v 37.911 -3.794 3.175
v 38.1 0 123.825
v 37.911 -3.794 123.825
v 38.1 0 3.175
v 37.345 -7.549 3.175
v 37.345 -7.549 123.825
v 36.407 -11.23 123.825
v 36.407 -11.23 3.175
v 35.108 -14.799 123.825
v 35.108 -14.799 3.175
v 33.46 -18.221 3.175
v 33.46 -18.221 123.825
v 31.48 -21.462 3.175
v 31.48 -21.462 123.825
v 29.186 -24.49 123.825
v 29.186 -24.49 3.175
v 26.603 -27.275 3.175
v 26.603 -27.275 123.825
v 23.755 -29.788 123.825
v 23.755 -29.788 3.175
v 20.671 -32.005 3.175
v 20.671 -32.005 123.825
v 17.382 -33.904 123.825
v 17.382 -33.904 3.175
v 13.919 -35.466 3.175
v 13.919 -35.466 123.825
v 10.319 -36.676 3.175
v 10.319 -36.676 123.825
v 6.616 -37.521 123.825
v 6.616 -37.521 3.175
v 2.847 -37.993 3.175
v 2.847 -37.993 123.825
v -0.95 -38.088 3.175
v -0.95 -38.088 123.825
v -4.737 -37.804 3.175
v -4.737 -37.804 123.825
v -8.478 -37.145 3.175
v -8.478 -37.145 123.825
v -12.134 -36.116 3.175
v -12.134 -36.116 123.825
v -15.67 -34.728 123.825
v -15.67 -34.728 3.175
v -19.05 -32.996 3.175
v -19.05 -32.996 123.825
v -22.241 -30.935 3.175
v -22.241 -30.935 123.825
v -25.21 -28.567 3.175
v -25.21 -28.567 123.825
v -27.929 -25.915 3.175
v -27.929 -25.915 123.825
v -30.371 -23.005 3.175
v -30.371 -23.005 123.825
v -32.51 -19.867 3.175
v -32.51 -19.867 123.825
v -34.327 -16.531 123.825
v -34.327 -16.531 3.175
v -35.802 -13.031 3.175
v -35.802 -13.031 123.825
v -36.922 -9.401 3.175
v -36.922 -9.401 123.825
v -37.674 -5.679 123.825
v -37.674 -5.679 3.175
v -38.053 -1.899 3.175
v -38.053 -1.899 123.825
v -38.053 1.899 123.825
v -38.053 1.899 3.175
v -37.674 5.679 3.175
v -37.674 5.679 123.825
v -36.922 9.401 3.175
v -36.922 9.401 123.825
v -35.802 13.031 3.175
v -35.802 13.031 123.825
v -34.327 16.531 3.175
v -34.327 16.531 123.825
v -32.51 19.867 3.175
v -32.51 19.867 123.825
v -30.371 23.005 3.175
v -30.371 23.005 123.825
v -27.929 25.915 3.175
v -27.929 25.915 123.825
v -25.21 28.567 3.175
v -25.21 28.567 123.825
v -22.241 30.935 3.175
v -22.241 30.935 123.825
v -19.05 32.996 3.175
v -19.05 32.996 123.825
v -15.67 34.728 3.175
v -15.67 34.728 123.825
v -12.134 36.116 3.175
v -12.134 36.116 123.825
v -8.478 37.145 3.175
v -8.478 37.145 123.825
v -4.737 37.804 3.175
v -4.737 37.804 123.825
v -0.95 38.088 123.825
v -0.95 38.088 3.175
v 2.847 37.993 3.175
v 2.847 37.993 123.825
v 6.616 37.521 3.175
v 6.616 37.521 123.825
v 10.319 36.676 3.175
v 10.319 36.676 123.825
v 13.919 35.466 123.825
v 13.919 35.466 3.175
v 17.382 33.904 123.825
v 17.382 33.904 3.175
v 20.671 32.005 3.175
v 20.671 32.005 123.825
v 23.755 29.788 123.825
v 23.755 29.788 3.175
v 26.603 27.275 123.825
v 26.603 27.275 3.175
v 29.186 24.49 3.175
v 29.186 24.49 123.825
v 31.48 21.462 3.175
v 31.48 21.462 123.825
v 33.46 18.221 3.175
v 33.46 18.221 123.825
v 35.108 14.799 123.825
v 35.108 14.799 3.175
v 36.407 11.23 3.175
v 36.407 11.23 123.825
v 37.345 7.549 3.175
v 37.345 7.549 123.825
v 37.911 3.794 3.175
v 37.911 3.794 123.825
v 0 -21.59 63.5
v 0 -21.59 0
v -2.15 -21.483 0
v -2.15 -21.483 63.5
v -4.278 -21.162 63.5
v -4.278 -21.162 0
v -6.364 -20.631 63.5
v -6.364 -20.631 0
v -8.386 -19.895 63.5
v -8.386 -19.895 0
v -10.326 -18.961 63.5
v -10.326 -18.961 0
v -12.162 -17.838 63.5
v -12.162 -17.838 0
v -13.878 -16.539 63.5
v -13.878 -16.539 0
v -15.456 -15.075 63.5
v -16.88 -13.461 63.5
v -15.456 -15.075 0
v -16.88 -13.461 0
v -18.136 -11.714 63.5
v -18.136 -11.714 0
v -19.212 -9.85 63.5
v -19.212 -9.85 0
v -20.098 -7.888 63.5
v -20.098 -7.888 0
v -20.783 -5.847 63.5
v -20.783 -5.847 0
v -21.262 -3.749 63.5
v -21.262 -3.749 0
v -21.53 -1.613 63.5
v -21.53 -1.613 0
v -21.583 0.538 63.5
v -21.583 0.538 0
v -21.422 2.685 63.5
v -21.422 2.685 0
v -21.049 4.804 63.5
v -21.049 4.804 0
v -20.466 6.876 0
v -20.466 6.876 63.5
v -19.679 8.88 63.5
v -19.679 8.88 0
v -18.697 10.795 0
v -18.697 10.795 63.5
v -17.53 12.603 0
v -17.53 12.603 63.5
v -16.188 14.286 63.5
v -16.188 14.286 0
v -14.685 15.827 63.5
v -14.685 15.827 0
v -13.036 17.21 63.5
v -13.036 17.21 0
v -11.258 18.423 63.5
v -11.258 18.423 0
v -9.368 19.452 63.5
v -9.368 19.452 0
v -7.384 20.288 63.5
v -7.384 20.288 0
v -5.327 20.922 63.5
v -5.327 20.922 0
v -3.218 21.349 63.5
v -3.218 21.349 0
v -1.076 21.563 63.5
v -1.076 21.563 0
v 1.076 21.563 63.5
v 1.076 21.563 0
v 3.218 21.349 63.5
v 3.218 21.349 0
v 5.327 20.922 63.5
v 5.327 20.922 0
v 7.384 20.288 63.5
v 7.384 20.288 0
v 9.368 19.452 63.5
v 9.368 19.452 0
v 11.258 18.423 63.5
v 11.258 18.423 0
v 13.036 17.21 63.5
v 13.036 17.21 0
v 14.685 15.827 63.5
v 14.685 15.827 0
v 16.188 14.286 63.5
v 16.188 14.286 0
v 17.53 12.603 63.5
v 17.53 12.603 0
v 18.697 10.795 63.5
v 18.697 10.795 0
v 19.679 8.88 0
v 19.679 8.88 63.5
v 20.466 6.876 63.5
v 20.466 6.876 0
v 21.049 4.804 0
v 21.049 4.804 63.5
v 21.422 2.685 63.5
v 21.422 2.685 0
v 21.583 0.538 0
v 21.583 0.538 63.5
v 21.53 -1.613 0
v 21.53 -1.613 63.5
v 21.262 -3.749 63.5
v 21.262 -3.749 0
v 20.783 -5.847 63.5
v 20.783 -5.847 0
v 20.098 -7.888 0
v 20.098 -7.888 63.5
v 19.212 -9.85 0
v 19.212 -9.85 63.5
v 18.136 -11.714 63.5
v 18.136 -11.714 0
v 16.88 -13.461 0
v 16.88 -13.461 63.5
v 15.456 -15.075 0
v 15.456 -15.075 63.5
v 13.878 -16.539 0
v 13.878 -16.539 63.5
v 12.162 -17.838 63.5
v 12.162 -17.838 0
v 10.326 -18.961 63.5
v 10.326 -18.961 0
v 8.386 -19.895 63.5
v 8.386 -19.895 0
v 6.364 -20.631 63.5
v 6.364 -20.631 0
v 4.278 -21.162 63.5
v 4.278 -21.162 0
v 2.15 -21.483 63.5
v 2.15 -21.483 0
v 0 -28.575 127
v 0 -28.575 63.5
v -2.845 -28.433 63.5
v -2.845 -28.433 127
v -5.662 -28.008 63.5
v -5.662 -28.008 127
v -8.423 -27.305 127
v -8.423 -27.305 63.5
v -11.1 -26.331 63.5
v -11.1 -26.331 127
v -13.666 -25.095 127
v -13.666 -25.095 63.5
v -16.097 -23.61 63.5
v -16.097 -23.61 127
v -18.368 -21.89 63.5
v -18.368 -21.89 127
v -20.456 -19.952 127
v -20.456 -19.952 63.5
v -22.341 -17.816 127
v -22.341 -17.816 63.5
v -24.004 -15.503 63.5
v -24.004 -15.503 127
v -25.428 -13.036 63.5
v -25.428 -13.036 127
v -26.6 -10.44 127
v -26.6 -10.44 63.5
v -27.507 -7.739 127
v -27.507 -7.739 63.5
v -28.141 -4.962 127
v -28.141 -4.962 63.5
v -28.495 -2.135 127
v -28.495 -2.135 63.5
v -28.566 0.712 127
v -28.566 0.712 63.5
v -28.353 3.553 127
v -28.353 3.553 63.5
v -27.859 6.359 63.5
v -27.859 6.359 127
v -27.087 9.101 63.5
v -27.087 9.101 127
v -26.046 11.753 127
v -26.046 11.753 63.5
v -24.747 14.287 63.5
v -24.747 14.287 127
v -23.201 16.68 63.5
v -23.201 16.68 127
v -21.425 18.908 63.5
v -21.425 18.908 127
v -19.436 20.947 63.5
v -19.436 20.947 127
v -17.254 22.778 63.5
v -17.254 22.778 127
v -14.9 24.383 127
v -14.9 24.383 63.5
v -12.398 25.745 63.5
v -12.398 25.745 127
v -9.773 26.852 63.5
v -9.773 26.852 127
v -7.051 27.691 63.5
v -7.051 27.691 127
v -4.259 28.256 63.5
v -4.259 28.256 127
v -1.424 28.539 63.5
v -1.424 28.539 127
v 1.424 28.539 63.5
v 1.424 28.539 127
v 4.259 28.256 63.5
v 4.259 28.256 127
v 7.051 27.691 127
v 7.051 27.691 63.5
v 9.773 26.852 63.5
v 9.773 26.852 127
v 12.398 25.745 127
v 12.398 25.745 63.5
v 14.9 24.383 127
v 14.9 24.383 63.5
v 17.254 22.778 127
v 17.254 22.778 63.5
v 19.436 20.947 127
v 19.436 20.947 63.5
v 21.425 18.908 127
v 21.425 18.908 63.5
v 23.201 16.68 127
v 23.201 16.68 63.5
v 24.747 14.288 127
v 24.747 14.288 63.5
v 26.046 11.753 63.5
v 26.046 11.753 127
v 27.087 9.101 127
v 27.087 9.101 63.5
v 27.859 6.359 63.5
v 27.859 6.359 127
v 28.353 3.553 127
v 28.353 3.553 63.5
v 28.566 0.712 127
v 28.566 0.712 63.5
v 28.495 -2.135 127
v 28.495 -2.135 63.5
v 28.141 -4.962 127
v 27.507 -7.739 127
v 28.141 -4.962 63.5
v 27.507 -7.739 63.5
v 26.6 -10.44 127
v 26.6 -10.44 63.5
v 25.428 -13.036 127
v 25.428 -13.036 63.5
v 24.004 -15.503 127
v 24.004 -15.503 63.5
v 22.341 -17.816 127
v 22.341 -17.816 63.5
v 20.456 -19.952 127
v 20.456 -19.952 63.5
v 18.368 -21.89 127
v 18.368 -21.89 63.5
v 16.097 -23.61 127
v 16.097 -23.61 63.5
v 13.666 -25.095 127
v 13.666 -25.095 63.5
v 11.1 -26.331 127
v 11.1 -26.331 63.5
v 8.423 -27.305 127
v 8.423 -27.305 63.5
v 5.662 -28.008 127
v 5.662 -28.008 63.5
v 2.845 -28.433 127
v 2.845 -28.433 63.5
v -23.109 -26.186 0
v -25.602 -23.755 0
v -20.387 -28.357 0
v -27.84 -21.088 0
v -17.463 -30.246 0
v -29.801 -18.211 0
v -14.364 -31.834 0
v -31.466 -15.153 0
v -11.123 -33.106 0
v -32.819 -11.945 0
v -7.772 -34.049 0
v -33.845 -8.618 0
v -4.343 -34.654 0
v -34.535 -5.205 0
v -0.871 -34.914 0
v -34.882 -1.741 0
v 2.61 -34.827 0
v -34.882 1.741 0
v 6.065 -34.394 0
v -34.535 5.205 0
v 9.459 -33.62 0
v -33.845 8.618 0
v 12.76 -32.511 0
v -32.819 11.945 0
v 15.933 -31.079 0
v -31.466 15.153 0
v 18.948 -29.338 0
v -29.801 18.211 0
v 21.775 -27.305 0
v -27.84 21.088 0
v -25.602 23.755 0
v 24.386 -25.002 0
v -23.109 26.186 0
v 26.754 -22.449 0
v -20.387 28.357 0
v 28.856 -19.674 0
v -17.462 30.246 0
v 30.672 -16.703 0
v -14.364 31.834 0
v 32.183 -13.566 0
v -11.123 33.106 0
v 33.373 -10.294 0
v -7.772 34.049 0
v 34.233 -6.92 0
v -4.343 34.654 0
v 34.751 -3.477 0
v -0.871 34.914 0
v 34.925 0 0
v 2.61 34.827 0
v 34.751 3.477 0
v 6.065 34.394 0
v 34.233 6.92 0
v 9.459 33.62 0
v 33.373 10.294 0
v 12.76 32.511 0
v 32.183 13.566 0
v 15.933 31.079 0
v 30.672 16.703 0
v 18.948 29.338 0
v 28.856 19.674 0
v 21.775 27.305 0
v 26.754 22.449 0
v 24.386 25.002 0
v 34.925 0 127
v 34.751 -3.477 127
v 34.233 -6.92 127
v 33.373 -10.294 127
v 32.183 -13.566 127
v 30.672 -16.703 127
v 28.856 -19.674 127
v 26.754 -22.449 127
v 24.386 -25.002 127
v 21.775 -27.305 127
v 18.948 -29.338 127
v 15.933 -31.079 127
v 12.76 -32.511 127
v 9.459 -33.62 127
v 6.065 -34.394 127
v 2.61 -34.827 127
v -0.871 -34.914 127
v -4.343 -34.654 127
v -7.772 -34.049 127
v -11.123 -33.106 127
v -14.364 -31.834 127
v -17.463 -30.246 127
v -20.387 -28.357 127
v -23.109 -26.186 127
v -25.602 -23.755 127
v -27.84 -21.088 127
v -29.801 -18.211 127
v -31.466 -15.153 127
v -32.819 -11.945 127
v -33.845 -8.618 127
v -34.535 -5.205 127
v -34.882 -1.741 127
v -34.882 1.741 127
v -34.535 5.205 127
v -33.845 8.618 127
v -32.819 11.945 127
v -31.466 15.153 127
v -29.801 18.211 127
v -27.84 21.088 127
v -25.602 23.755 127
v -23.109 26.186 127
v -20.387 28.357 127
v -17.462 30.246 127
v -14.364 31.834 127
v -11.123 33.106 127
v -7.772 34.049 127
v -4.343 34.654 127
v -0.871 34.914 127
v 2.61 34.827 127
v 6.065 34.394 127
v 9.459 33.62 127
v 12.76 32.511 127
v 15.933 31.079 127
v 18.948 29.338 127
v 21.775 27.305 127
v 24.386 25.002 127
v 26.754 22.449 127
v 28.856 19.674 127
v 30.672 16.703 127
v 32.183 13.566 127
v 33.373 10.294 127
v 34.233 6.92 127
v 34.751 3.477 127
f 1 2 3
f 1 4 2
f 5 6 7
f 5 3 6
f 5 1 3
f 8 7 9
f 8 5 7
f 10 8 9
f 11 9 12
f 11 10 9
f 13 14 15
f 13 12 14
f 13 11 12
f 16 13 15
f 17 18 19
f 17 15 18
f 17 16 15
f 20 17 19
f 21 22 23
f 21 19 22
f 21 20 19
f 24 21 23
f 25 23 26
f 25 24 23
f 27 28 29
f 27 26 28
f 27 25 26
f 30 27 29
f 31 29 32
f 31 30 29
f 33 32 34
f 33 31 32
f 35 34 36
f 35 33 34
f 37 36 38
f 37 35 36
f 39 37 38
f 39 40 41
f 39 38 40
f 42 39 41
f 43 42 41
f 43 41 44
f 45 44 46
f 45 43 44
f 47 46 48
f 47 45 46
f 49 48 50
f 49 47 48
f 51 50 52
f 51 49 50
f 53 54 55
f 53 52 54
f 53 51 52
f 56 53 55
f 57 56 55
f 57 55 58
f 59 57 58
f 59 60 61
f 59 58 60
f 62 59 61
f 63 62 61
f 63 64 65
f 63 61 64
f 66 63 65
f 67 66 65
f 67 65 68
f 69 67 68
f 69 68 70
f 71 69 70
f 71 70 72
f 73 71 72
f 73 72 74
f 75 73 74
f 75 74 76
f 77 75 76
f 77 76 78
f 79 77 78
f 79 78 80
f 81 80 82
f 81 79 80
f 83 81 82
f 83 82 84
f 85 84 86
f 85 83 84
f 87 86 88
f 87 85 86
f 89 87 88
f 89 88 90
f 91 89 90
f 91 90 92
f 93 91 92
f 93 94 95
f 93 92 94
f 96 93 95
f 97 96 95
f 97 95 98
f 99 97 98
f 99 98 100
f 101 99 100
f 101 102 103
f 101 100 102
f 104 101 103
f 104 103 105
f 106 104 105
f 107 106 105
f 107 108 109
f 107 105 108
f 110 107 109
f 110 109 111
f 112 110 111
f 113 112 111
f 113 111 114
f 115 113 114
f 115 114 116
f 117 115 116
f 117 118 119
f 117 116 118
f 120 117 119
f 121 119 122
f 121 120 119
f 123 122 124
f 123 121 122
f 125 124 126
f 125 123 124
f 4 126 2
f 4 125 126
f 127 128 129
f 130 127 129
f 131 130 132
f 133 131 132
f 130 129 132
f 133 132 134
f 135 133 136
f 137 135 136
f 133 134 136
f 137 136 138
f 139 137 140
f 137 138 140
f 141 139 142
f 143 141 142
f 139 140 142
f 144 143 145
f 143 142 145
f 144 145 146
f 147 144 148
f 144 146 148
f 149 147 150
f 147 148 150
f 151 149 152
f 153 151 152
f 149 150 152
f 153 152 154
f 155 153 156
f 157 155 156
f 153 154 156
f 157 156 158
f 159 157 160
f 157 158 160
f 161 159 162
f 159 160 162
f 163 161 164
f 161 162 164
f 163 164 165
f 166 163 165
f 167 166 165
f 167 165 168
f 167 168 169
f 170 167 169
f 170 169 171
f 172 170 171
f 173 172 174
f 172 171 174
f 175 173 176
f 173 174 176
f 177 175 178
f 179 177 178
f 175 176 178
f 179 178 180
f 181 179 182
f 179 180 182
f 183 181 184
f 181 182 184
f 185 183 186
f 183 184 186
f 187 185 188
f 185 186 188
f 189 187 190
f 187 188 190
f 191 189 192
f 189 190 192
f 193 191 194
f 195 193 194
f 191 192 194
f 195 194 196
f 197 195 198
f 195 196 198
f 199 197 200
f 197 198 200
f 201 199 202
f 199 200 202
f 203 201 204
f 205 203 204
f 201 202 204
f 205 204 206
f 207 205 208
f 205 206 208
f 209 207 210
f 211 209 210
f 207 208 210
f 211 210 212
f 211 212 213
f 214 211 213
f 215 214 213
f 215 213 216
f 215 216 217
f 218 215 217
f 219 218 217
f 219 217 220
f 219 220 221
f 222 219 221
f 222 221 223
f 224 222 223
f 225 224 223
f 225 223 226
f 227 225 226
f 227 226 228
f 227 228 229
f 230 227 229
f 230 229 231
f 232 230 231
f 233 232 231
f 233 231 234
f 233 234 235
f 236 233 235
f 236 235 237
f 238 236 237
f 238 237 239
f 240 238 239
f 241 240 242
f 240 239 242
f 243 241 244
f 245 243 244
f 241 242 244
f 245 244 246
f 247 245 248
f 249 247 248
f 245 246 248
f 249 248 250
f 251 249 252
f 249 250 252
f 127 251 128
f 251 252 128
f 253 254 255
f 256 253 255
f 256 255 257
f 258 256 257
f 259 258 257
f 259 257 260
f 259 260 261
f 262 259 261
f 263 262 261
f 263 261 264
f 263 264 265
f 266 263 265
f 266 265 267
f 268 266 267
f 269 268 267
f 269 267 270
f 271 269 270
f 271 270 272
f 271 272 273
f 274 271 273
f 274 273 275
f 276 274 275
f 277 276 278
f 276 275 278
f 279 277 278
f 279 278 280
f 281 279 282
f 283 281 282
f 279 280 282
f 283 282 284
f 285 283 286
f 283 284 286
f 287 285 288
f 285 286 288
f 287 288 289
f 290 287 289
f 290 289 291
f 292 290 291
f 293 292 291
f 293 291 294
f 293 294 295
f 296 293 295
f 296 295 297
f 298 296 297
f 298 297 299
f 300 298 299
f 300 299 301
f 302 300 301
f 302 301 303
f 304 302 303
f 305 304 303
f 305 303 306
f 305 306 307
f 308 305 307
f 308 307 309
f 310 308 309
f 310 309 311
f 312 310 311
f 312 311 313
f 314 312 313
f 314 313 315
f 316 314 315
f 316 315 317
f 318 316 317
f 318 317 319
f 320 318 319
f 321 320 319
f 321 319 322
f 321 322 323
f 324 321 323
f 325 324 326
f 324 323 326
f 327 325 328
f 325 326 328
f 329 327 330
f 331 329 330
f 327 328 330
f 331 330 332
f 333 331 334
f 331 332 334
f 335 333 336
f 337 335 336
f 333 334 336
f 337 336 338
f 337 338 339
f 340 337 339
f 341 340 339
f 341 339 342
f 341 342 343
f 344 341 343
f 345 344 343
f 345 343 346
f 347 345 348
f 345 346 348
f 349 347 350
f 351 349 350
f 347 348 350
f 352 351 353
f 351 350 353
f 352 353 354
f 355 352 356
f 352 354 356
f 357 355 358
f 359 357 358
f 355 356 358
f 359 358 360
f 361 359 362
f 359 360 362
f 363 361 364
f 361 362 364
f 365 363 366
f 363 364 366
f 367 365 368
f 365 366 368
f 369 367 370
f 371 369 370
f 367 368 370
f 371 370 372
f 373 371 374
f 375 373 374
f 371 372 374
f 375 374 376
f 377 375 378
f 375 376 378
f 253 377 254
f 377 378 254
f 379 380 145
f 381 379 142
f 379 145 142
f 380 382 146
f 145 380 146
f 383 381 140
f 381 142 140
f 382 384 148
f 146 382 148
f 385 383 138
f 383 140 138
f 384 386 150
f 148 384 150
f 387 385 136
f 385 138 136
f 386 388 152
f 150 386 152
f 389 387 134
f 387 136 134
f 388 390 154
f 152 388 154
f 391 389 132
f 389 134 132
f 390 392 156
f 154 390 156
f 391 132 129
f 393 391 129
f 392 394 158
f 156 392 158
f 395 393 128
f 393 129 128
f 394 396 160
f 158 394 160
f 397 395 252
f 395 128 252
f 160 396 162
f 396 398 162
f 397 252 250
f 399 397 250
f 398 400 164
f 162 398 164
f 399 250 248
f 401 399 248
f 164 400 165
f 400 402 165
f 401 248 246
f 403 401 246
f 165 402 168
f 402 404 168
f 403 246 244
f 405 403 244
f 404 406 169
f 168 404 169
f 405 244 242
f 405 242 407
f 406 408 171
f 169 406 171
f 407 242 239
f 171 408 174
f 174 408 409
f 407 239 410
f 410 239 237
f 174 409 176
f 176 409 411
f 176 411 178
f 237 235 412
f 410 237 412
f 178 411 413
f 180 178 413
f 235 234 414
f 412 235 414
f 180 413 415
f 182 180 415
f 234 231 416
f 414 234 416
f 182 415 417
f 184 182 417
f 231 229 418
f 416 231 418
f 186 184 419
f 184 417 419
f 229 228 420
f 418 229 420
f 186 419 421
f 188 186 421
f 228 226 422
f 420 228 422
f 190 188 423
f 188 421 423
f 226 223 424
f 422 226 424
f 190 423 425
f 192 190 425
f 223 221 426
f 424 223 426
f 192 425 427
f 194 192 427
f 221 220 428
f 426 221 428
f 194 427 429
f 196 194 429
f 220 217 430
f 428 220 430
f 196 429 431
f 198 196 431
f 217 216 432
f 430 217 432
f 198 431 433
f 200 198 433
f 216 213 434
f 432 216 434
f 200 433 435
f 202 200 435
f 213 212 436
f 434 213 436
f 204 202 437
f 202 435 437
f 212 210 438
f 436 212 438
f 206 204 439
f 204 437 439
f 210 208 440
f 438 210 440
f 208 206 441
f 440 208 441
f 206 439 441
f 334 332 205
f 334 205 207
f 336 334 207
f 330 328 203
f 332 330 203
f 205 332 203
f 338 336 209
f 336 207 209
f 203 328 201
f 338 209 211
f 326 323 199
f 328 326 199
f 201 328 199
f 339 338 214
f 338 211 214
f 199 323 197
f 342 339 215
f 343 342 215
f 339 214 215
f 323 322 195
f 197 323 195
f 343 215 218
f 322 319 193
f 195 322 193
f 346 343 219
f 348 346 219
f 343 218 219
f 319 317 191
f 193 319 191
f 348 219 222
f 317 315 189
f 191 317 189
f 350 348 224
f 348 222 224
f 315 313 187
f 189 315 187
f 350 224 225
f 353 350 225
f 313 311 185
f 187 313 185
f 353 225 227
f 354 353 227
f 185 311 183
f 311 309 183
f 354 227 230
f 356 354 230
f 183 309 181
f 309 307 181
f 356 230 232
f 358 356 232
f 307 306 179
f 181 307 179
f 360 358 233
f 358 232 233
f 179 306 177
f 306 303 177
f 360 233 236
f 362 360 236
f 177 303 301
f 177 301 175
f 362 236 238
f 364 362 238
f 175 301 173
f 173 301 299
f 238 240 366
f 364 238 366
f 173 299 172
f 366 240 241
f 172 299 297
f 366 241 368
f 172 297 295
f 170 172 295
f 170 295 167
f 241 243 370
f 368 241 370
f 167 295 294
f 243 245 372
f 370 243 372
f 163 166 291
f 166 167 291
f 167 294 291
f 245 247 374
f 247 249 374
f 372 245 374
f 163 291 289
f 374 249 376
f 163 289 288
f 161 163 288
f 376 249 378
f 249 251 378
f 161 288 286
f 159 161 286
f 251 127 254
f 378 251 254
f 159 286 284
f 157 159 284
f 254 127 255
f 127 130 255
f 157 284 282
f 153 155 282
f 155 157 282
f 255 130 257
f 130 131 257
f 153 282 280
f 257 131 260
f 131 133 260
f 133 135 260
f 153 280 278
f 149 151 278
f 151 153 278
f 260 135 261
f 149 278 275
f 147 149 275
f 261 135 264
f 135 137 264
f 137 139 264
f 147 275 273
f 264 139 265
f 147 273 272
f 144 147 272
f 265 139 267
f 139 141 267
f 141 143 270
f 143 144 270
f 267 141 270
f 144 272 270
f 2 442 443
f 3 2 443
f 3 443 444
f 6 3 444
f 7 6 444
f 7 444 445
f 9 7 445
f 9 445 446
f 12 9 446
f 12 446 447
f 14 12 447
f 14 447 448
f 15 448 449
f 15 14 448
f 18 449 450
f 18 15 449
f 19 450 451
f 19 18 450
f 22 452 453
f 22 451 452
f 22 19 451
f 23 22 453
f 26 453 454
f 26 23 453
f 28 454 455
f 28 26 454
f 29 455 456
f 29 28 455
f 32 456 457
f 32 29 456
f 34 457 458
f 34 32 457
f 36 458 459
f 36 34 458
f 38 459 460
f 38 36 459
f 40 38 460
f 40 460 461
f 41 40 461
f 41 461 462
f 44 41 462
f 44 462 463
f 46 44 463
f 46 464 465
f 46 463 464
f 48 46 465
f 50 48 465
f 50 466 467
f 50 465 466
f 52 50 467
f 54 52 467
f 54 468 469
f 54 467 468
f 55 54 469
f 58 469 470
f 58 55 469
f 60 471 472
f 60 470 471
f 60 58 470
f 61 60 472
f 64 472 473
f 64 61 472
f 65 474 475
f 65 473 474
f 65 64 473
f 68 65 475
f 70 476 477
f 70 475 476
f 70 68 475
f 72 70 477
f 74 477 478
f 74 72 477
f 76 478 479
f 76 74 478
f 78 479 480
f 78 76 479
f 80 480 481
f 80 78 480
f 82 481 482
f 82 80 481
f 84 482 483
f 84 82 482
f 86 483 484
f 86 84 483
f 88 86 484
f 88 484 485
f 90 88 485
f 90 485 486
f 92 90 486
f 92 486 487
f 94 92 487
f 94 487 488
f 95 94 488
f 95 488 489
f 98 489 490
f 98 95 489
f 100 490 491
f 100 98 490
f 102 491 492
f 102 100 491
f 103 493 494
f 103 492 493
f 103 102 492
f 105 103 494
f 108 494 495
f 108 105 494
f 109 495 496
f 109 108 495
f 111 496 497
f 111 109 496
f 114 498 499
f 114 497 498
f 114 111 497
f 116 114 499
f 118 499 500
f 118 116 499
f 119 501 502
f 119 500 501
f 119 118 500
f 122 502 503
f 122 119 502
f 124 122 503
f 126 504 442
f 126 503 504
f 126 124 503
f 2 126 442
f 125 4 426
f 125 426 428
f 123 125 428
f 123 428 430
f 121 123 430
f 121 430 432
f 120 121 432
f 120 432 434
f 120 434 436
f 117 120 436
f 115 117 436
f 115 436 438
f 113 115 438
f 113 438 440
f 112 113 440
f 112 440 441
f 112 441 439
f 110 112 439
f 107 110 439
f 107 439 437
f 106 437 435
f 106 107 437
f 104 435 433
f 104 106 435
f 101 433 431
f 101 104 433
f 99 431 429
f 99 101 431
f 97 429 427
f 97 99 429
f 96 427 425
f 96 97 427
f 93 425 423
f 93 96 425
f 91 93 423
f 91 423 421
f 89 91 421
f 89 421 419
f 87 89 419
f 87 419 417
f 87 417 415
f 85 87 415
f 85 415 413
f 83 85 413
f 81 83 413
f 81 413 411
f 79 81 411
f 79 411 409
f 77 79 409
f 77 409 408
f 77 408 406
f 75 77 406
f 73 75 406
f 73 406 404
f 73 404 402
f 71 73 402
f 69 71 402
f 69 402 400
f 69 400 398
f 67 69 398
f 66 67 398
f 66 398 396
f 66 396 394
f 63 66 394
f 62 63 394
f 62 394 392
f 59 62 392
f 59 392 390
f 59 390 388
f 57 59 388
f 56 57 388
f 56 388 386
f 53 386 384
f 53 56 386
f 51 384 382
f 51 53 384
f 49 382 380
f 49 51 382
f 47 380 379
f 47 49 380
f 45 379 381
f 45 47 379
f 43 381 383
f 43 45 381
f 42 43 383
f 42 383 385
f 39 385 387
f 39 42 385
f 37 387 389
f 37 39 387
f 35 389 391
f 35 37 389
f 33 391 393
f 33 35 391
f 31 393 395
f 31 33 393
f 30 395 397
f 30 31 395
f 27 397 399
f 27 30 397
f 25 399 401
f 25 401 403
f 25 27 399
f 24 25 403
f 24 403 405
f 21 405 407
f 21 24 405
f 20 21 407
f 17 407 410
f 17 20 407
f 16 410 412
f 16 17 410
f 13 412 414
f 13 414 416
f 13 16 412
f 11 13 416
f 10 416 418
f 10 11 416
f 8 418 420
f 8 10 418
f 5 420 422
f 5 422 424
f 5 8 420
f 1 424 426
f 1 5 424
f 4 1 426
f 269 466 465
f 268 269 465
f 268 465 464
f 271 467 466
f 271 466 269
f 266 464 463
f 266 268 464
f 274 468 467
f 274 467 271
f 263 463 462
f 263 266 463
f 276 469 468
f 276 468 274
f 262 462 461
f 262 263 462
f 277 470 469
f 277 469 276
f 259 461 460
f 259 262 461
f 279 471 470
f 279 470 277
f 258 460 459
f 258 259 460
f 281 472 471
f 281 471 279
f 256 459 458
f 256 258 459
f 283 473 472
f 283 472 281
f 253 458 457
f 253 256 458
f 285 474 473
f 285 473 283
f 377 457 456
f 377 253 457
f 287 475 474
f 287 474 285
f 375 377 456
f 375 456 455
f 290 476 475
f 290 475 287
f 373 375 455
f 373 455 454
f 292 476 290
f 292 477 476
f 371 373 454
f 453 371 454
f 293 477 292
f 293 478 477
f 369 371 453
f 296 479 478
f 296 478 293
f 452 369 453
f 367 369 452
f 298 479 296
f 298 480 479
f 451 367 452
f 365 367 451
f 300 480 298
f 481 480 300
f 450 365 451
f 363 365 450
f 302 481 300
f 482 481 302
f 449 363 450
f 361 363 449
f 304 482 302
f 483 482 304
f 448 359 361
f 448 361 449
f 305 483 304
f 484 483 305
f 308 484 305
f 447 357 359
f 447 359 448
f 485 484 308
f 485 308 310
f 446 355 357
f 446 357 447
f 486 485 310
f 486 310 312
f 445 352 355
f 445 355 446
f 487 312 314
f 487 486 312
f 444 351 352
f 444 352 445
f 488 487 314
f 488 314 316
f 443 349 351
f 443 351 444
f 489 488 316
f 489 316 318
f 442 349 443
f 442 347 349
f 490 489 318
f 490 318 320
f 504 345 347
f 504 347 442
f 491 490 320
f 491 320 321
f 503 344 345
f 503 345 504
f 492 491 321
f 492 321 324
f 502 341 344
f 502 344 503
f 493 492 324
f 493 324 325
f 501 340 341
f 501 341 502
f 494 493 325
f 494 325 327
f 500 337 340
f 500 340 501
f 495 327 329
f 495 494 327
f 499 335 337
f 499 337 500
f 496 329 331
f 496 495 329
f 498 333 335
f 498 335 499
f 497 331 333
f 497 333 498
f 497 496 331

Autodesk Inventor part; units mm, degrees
ref_plane "YZ Plane" through (0, 0, 0) normal (1, 0, 0) x (0, 1, 0)
ref_plane "XZ Plane" through (0, 0, 0) normal (0, 1, 0) x (-1, 0, 0)
ref_plane "XY Plane" through (0, 0, 0) normal (0, 0, 1) x (1, 0, 0)
sketch "Sketch1" plane through (0, 0, 0) normal (0, 0, 1) x (1, 0, 0)
  circle A0 centre (0, 0) radius 38.1
  dimension "d0" = 76.2
extrude "Extrusion1" add sketch "Sketch1" along normal blind 127
chamfer "Chamfer1" distance 3.175 angle 45 2 edges at (-38.1, 0, 0) (-38.1, 0, 127)
sketch "Sketch2" plane through (0, 0, 127) normal (0, 0, 1) x (1, 0, 0)
  point P0 (0, 0)
hole "Hole1" at (0, 0, 127) direction (0, 0, -1) diameter 43.18 end through all counterbore diameter 57.15 counterbore depth 63.5 clearance for "Hex Head Bolt" size "1-1/2" standard "Ansi Unified Screw Threads"
properties part number "Coupler" material "Steel, Mild"
